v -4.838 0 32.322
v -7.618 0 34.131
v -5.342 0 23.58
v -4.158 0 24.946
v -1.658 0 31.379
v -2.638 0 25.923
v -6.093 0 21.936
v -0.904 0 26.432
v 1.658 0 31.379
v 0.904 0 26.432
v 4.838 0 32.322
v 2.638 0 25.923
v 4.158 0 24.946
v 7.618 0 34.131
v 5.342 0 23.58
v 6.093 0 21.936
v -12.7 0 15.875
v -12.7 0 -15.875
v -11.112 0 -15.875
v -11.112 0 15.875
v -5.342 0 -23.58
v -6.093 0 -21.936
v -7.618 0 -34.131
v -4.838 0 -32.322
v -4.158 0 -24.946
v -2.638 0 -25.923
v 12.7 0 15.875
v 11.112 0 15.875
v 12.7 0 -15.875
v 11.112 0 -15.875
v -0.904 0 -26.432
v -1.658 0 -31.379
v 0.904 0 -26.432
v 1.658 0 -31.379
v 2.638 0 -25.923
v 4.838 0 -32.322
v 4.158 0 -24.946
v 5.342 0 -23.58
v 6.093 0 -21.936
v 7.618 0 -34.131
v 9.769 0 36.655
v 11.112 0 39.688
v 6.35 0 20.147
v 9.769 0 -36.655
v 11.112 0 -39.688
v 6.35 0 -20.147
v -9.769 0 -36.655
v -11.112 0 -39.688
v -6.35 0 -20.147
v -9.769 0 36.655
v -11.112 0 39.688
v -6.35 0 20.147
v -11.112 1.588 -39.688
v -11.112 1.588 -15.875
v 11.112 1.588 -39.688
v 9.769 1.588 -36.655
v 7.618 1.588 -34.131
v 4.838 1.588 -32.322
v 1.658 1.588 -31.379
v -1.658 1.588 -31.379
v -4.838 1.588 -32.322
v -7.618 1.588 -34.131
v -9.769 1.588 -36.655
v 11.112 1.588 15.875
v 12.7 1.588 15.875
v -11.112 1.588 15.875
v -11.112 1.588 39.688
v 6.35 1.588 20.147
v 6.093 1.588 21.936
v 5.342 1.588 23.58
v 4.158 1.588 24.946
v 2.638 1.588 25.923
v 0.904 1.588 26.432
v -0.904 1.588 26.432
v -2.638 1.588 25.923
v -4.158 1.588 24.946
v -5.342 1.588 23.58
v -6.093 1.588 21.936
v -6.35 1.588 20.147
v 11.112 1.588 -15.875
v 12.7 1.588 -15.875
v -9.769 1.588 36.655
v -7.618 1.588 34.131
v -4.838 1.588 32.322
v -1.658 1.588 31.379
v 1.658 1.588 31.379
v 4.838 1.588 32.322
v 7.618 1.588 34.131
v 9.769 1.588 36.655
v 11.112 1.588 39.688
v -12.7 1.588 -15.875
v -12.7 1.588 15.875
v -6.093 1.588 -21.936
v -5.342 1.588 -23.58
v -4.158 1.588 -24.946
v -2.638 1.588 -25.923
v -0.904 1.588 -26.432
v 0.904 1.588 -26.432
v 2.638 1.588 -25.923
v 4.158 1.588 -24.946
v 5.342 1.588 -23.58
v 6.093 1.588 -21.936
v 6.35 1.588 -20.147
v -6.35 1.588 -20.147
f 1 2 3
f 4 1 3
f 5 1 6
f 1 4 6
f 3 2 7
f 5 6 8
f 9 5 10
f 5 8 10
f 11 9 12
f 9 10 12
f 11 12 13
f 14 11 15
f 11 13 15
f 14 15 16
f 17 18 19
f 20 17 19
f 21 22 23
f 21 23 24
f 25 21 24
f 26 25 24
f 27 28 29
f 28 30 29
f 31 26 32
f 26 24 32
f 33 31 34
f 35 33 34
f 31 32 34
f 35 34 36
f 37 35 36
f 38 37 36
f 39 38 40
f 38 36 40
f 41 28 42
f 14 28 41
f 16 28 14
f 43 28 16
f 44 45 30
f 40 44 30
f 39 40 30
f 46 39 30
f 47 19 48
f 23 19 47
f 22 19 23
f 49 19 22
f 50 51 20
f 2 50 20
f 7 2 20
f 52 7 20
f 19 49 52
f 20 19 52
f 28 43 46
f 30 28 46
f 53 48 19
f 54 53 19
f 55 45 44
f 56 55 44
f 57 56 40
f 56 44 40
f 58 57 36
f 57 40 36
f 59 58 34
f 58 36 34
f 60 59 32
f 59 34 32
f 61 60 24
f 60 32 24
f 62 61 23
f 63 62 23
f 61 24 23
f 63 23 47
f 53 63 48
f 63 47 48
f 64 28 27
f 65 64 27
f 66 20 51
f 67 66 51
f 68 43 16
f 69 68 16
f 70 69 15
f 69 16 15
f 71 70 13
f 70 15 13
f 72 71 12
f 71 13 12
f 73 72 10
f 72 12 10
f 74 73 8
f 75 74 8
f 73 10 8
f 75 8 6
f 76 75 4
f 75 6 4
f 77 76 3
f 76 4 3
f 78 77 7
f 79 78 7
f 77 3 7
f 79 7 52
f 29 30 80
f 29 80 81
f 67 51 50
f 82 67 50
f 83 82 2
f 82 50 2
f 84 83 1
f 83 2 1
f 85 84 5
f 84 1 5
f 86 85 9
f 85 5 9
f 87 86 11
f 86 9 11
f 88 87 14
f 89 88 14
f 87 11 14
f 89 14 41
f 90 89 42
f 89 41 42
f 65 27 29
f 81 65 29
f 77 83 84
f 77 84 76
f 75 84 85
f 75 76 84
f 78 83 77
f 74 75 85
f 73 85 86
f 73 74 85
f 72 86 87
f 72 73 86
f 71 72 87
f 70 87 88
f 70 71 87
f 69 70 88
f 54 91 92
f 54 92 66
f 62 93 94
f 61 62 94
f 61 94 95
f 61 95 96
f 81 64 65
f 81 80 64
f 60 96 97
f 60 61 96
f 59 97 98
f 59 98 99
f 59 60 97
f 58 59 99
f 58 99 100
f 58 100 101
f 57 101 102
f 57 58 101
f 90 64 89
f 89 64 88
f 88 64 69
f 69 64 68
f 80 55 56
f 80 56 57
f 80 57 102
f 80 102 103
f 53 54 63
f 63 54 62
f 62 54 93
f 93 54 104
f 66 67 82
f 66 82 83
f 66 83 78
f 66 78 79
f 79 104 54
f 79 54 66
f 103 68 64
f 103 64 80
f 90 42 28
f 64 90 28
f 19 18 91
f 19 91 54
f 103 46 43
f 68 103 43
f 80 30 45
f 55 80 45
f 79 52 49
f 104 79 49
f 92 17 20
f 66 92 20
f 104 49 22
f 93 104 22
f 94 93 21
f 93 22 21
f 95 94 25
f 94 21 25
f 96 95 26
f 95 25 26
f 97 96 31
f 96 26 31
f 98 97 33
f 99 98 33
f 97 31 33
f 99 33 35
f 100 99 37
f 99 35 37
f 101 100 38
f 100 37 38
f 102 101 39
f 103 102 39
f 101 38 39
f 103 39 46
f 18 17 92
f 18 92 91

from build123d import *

# Parameters (mm, degrees)
SKETCH1_W           = 1.5875
SKETCH1_H           = 31.75
BOSS_EXTRUDE1_DEPTH = 1.5875


with BuildPart() as part:
    # Sketch1 → Boss-Extrude1 (new body)
    # profile 1 of 3: a face of its own
    with BuildSketch(Plane(origin=(0, 0, 0), x_dir=(1, 0, 0), z_dir=(0, 1, 0))):
        with BuildLine():
            Line((11.1125, -39.6875), (11.1125, -15.875))
            Line((11.1125, -15.875), (11.1125, 15.875))
            Line((11.1125, 15.875), (11.1125, 39.6875))
            ThreePointArc((11.1125, 39.6875), (0, 31.259108818), (-11.1125, 39.6875))
            Line((-11.1125, 39.6875), (-11.1125, 15.875))
            Line((-11.1125, 15.875), (-11.1125, -15.875))
            Line((-11.1125, -15.875), (-11.1125, -39.6875))
            ThreePointArc((-11.1125, -39.6875), (0, -31.259108818), (11.1125, -39.6875))
        make_face()
        with BuildLine():
            ThreePointArc((-6.35, 20.146608818), (0, 26.496608818), (6.35, 20.146608818))
            Line((6.35, 20.146608818), (6.35, -20.146608818))
            ThreePointArc((6.35, -20.146608818), (0, -26.496608818), (-6.35, -20.146608818))
            Line((-6.35, -20.146608818), (-6.35, 20.146608818))
        make_face(mode=Mode.SUBTRACT)
    # profile 2 of 3: a face of its own
    with BuildSketch(Plane(origin=(0, 0, 0), x_dir=(1, 0, 0), z_dir=(0, 1, 0))):
        with Locations((-11.90625, 0)):
            Rectangle(SKETCH1_W, SKETCH1_H)
    # profile 3 of 3: a face of its own
    with BuildSketch(Plane(origin=(0, 0, 0), x_dir=(1, 0, 0), z_dir=(0, 1, 0))):
        with Locations((11.90625, 0)):
            Rectangle(SKETCH1_W, SKETCH1_H)
    extrude(amount=BOSS_EXTRUDE1_DEPTH)


solid = part.part
